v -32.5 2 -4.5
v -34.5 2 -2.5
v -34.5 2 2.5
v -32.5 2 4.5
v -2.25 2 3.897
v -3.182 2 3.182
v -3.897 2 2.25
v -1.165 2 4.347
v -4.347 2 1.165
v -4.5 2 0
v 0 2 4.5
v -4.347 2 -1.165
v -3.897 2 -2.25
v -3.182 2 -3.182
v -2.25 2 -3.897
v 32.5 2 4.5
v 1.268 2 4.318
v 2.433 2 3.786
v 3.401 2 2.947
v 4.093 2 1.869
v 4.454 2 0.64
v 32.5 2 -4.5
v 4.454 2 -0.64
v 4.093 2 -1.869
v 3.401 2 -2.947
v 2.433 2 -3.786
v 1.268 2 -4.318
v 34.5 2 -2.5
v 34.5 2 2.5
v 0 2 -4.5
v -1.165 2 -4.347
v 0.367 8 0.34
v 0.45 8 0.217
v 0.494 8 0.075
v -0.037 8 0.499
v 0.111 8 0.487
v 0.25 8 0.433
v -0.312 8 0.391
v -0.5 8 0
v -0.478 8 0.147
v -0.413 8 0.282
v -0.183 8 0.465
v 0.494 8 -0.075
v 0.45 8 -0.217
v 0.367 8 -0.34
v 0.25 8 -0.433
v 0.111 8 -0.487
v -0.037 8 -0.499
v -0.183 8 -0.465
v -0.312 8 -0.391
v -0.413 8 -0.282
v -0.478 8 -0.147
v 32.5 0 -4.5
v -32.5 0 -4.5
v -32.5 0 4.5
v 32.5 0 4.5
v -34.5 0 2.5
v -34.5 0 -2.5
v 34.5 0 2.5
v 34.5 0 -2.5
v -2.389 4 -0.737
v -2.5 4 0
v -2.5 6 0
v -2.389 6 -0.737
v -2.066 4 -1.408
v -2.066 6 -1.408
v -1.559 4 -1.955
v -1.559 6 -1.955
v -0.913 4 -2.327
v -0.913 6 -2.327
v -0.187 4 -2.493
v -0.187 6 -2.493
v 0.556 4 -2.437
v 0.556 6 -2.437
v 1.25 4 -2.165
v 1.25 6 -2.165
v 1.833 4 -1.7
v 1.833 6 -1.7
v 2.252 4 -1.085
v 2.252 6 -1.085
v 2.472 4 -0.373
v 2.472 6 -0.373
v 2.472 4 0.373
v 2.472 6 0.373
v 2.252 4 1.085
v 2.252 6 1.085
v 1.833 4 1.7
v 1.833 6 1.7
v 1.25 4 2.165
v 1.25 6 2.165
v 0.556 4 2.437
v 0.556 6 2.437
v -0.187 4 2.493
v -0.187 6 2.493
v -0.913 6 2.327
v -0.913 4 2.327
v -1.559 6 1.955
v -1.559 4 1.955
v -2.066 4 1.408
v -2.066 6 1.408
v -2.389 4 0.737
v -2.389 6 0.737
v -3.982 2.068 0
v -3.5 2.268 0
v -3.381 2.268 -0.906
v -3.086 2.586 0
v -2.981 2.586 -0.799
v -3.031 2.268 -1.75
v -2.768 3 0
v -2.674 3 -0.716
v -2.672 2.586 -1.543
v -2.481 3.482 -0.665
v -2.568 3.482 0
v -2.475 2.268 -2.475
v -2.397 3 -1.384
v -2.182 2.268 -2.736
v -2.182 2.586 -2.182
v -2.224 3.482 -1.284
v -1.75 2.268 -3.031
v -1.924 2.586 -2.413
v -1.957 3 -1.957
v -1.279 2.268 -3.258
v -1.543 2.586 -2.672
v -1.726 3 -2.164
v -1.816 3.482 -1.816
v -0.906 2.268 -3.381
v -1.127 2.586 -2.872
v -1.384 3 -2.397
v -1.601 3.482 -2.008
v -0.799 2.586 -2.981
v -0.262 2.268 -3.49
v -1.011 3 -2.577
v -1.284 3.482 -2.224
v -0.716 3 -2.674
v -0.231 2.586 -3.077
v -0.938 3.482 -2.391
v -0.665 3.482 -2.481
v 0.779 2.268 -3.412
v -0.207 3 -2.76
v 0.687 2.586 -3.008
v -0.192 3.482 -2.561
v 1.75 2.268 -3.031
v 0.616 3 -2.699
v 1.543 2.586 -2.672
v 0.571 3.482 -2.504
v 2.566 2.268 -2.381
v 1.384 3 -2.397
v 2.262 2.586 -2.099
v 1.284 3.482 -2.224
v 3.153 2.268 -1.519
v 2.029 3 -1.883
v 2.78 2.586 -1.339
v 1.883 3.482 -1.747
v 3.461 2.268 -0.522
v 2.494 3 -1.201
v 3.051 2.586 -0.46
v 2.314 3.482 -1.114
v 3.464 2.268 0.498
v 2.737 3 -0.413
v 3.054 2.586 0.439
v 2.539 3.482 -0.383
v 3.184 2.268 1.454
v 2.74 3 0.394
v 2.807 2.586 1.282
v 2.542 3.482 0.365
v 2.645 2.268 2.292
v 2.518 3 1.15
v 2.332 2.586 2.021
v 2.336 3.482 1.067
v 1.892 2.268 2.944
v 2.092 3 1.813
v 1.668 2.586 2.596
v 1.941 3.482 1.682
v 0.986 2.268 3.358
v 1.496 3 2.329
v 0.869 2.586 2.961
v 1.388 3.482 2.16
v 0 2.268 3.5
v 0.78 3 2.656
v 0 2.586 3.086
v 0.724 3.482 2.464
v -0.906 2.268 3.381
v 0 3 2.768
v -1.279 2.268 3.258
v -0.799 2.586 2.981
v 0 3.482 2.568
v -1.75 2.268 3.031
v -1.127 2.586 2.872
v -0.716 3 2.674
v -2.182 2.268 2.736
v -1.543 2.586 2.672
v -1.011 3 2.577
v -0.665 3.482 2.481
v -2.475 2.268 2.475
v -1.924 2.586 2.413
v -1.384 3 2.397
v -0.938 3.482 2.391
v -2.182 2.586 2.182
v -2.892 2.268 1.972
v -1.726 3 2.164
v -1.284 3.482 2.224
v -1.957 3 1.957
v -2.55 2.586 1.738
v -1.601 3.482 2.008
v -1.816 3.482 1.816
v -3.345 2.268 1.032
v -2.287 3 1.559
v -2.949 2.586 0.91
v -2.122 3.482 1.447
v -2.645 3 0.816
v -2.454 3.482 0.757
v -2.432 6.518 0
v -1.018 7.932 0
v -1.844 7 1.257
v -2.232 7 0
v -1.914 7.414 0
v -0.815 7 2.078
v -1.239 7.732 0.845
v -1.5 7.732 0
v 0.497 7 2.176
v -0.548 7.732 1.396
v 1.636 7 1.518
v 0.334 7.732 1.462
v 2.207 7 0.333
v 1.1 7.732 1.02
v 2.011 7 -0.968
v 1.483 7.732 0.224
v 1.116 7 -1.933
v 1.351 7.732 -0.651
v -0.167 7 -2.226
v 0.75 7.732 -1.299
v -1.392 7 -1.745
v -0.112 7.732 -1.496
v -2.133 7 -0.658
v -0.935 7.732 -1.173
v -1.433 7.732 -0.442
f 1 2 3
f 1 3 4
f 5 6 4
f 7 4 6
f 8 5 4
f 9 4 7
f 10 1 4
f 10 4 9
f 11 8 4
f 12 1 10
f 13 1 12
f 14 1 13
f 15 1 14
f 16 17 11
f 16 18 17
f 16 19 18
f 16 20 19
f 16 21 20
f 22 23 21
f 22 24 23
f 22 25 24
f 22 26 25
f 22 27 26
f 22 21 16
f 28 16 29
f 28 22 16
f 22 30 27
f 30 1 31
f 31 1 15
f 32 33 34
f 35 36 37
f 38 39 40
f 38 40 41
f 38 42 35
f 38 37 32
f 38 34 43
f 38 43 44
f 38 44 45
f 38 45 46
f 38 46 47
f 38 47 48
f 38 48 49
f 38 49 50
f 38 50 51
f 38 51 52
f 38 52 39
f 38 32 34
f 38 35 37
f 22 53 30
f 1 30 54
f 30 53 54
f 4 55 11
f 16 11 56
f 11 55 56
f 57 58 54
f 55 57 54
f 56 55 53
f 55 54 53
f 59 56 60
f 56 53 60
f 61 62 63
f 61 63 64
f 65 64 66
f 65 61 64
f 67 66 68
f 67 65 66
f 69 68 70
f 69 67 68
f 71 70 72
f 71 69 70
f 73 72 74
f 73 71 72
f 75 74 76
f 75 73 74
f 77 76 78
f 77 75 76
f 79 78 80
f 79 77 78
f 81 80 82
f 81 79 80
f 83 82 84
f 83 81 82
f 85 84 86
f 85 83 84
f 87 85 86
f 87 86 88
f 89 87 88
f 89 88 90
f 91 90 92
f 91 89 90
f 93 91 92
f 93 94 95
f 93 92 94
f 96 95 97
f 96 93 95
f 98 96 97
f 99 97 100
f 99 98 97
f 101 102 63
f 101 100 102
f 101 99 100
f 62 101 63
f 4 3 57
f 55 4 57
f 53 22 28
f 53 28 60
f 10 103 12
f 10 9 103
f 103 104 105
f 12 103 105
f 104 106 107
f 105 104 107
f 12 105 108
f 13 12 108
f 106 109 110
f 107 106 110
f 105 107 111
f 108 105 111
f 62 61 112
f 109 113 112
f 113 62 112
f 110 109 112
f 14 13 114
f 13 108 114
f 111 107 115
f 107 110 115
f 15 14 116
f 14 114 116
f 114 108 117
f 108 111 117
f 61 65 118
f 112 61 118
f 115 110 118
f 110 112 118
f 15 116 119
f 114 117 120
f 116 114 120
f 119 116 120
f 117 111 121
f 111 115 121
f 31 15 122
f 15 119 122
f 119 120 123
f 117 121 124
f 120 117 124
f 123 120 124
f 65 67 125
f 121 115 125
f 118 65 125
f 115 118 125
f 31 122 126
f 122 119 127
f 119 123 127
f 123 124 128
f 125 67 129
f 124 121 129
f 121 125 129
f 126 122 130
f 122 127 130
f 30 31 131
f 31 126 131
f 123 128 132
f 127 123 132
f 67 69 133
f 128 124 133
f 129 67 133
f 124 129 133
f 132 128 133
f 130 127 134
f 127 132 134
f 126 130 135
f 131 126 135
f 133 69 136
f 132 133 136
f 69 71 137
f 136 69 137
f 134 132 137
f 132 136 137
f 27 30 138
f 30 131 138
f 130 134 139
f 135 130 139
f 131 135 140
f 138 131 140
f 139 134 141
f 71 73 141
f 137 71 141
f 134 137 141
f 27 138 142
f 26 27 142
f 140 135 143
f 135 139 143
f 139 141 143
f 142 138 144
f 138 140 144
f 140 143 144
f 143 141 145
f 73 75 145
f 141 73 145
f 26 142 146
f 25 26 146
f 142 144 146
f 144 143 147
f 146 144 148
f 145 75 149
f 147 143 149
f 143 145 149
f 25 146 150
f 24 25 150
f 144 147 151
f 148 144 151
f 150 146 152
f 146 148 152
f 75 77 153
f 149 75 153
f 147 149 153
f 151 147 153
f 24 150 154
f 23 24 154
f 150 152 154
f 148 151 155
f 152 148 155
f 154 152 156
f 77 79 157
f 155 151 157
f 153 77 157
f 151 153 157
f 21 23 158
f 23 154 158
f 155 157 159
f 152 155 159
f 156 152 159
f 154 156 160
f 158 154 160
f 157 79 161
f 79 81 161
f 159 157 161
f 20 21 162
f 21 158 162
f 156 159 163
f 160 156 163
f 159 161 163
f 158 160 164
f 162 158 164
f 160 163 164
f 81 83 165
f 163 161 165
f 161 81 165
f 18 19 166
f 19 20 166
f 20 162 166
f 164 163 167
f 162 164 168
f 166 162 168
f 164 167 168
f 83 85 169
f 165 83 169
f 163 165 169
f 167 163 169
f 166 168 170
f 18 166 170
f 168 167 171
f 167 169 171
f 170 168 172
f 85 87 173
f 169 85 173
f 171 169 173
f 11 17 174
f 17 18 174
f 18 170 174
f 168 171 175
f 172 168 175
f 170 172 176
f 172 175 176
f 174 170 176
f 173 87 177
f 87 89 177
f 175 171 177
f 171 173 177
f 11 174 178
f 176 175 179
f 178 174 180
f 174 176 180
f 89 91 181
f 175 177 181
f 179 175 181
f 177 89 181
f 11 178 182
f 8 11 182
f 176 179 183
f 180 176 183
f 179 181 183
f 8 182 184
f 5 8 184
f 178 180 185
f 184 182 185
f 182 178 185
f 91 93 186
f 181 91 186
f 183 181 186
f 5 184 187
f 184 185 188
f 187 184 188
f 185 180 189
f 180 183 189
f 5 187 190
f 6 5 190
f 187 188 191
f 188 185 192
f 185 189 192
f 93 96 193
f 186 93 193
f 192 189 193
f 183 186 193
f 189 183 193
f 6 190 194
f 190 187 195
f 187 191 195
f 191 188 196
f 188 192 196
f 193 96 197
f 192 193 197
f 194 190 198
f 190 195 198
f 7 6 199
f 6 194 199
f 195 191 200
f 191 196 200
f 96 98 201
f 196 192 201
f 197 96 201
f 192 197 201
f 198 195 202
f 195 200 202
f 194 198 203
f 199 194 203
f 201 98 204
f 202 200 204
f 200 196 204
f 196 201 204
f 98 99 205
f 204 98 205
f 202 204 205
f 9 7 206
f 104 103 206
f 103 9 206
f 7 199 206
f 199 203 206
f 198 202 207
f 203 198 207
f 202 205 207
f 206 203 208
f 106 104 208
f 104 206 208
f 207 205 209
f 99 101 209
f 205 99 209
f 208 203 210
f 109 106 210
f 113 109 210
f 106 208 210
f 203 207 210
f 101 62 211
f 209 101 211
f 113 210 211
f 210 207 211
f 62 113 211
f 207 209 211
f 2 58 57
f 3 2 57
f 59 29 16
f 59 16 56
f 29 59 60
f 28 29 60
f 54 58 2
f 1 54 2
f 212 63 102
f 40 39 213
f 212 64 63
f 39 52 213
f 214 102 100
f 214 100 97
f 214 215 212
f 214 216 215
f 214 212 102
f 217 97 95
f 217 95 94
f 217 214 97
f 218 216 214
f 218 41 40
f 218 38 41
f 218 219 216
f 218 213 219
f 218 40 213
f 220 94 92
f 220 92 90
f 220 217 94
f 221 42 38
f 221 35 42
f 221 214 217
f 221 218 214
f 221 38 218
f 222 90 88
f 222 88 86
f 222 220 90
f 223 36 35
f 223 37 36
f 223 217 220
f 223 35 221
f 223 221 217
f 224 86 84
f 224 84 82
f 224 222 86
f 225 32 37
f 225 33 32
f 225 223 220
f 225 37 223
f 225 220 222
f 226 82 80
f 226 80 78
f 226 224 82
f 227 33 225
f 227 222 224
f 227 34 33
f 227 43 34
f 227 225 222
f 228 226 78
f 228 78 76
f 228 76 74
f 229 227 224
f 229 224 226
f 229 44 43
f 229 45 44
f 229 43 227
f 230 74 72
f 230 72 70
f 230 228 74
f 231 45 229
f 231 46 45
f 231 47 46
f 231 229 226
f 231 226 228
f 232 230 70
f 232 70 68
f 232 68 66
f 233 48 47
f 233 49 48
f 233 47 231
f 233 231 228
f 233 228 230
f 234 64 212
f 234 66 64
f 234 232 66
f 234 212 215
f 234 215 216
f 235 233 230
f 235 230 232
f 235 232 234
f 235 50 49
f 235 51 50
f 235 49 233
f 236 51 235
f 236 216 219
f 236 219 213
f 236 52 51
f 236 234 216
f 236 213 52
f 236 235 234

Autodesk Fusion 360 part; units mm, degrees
sketch "Sketch2" plane through (0, 0, 0) normal (0, 1, 0) x (1, 0, 0)
  line L0 (-34.5, -4.5) -> (34.5, -4.5)
  line L1 (34.5, -4.5) -> (34.5, 4.5)
  line L2 (34.5, 4.5) -> (-34.5, 4.5)
  line L3 (-34.5, 4.5) -> (-34.5, -4.5)
  line L4 (-34.5, -4.5) -> (34.5, 4.5) construction
  line L5 (34.5, -4.5) -> (-34.5, 4.5) construction
  circle A0 centre (0, 0) radius 2.5
  dimension "d1" = 69
  dimension "d2" = 9
  dimension "d3" = 5
extrude "Extrude1" add sketch "Sketch2" along normal blind 2 contours L0 L1 L2 L3 | A0 makes body 1
sketch "Sketch3" plane through (0, 2, 0) normal (0, 1, 0) x (-1, 0, 0)
  line L0 (34.5, -4.5) -> (34.5, 4.5)
  line L1 (34.5, 4.5) -> (-34.5, 4.5)
  line L2 (-34.5, 4.5) -> (-34.5, -4.5)
  line L3 (-34.5, -4.5) -> (34.5, -4.5)
  circle A0 centre (0, 0) radius 2.5
  circle A1 centre (0, 0) radius 2.5
extrude "Extrude3" add sketch "Sketch3" along normal blind 6 contours A0 A1 bodies 1
fillet "Fillet3" radius 2 1 edges at (2.3308, 2, 0.904) on bodies 1
fillet "Fillet4" radius 2 1 edges at (2.3308, 8, -0.904) on bodies 1
chamfer "Chamfer2" distance 2 angle 45 4 edges at (34.5, 1, 4.5) (34.5, 1, -4.5) (-34.5, 1, -4.5) (-34.5, 1, 4.5) on bodies 1
copy_body "Body->Comp1" bodies 1 removing the originals makes body 2 in component "spring"
component "spring" placed x (1, 0, 0) y (0, 1, 0) z (0, 0, 1) at (0, 0, 0)
equation "d4 = spring_thickness"
equation "d15 = post_length"
equation "spring_thickness = 2 mm"
equation "post_length = 6 mm"
